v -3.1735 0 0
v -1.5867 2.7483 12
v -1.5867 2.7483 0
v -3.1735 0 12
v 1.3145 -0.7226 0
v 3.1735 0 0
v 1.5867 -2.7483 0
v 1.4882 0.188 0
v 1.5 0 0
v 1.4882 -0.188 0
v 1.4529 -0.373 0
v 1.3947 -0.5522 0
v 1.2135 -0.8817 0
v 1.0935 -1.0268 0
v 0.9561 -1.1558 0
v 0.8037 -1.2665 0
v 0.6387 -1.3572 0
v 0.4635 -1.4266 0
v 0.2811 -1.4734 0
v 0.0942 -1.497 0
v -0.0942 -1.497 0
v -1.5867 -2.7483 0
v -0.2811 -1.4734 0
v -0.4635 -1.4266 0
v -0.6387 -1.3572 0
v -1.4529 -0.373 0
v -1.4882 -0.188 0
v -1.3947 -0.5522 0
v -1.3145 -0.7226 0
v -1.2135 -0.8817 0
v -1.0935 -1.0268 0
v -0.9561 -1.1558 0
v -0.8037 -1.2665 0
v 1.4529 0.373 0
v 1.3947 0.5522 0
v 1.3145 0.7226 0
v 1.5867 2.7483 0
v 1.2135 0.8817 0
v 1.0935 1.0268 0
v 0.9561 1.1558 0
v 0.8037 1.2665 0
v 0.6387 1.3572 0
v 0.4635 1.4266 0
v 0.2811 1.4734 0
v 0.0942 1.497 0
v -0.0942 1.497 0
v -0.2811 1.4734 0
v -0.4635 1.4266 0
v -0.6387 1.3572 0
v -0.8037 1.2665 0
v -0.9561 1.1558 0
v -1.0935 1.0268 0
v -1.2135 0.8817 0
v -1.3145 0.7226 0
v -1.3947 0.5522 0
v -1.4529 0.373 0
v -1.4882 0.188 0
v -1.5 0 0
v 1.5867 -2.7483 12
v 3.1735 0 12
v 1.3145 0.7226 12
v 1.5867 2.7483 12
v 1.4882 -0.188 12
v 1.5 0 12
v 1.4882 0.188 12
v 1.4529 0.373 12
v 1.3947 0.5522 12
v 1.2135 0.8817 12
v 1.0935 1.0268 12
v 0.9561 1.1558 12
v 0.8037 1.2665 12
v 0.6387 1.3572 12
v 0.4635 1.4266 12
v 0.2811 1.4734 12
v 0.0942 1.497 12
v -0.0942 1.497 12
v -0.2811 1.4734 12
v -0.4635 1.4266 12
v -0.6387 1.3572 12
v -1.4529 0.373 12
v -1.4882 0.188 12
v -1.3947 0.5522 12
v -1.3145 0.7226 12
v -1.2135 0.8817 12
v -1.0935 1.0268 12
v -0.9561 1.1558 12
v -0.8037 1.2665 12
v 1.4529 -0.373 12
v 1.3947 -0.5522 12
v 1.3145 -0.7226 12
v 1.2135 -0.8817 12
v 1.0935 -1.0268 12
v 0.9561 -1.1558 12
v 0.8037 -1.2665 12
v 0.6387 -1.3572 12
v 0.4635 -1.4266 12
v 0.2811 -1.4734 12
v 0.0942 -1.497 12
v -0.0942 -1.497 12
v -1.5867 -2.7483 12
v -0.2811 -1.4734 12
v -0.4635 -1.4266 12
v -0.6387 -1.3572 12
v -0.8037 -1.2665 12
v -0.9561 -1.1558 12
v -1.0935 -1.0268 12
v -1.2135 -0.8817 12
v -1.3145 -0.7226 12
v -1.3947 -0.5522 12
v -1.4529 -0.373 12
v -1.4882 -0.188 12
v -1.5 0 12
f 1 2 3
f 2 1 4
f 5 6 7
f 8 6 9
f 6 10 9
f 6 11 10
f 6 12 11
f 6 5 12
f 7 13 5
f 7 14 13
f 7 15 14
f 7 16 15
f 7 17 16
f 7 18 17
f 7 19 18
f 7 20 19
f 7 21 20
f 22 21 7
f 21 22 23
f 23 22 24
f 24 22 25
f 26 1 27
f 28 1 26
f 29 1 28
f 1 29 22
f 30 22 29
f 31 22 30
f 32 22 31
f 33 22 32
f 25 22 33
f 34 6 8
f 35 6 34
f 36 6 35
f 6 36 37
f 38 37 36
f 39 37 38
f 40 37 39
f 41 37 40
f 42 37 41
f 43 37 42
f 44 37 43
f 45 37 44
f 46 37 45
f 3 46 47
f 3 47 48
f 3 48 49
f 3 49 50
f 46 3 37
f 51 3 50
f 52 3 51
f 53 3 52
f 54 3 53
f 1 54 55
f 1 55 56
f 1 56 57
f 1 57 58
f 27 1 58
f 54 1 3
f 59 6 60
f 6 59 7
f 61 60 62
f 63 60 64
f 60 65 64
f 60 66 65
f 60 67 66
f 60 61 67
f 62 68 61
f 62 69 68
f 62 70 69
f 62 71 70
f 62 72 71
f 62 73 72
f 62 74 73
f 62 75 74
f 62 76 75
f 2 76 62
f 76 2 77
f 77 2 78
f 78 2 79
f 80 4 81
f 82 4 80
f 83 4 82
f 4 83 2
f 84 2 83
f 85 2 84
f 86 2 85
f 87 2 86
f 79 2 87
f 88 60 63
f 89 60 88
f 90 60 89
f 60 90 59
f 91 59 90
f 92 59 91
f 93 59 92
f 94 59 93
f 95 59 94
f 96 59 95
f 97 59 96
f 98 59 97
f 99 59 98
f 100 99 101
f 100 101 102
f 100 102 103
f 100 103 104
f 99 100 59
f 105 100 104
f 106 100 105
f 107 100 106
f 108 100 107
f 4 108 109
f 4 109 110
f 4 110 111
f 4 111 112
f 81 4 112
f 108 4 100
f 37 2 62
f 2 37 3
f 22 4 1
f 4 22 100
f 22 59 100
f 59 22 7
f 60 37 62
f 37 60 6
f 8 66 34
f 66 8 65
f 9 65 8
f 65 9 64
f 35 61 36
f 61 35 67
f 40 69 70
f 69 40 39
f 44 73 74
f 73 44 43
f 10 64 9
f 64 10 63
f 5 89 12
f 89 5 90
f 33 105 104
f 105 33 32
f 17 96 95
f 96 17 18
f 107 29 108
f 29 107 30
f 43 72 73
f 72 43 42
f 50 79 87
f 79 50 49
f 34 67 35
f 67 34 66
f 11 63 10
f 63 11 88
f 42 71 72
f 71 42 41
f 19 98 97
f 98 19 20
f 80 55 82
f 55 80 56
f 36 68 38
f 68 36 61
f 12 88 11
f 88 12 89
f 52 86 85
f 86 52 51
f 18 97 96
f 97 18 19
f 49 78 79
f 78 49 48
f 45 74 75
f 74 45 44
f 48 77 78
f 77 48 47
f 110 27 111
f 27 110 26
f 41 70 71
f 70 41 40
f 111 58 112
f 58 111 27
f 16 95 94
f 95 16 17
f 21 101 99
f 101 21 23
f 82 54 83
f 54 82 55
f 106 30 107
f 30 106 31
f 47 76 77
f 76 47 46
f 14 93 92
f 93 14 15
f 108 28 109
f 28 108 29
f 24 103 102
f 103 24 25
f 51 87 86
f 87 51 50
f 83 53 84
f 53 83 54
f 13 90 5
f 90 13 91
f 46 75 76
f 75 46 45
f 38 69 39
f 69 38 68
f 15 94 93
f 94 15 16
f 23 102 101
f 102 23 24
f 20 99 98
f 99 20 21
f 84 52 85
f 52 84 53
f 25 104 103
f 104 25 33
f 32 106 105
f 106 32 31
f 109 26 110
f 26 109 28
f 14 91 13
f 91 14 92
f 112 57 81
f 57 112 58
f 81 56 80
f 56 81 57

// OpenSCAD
$fn = 50;


difference() {
	union() {
		translate(v = [0, 0, 0]) {
			rotate(a = [0, 0, 0]) {
				translate(v = [0, 0, 0]) {
					rotate(a = [0, 0, 0]) {
						linear_extrude(height = 12) {
							polygon(points = [[3.1735000000, 0.0000000000], [1.5867500000, 2.7483316189], [-1.5867500000, 2.7483316189], [-3.1735000000, 0.0000000000], [-1.5867500000, -2.7483316189], [1.5867500000, -2.7483316189]]);
						}
					}
				}
			}
		}
	}
	union() {
		translate(v = [0, 0, 0]) {
			rotate(a = [0, 0, 0]) {
				cylinder(h = 12, r = 1.5000000000);
			}
		}
	}
}
